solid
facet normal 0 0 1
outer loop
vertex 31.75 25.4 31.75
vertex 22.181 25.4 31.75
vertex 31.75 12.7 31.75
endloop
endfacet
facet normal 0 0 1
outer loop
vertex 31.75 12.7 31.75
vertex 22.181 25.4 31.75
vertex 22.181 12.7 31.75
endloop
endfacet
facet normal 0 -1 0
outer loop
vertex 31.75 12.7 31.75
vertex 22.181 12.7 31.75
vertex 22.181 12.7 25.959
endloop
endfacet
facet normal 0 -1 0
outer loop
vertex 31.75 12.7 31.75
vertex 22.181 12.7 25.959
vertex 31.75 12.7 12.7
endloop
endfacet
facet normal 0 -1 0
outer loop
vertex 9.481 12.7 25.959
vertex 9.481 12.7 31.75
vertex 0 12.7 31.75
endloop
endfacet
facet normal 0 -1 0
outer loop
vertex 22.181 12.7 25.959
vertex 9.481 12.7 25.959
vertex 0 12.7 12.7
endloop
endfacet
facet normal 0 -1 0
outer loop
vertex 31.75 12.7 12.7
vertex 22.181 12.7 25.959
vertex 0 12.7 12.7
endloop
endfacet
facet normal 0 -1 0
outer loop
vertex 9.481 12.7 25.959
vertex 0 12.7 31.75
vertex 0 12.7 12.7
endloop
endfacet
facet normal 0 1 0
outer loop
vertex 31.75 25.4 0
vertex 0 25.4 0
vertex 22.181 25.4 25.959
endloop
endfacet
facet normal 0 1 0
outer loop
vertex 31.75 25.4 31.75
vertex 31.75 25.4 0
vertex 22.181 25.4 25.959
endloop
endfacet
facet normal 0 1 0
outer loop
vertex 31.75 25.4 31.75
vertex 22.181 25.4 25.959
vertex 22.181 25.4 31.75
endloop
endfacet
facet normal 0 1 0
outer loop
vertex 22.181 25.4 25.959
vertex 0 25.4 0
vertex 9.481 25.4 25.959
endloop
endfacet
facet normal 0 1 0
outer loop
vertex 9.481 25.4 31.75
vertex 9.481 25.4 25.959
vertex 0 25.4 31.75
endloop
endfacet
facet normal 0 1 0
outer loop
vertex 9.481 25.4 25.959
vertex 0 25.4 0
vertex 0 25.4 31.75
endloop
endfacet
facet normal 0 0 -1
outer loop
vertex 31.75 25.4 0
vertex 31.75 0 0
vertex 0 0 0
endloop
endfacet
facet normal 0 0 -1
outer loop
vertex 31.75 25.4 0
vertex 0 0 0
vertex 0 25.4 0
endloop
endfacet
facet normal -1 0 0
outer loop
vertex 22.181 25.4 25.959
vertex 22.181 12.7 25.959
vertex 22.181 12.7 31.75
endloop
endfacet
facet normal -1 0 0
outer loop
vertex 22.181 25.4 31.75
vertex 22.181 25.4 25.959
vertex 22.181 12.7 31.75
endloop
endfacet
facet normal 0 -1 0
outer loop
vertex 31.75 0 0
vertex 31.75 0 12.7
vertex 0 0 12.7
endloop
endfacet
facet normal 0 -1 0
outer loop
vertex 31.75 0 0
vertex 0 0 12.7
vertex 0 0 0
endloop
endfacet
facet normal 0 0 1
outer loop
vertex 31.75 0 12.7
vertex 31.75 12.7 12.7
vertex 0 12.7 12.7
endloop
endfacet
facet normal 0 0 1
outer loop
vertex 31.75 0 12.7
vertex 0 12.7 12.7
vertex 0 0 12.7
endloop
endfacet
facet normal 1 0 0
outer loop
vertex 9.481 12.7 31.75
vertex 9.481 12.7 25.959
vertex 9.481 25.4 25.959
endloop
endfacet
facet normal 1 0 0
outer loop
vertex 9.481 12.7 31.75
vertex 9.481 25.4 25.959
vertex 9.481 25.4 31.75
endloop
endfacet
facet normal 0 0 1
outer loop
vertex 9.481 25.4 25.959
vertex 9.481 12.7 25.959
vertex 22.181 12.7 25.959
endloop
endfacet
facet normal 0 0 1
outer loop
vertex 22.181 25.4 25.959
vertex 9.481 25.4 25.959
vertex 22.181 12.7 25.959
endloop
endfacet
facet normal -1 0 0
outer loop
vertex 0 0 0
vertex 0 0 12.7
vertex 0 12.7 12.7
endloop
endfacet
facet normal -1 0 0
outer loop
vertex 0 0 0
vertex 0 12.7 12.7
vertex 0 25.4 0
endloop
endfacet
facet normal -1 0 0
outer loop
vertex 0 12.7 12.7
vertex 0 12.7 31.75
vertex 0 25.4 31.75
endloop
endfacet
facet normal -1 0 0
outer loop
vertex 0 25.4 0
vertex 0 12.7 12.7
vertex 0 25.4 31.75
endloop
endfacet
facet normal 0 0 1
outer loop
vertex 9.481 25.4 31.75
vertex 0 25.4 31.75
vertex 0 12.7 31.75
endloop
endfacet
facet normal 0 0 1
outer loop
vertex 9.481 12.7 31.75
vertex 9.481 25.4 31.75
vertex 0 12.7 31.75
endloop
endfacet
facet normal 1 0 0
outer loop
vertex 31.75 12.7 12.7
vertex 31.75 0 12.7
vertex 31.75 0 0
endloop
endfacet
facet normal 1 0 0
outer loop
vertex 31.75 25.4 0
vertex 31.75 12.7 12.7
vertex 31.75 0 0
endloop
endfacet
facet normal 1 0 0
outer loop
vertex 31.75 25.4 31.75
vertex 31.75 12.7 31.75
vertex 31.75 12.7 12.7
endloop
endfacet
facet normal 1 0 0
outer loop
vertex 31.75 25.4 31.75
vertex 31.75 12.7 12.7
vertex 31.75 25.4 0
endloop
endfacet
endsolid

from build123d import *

# Parameters (mm, degrees)
F1_DEPTH = 31.75
F2_W     = 12.7
F2_H     = 6.35
F3_DEPTH = 25.4
F4_DEPTH = 25.4


with BuildPart() as f1:
    # F0 (on Right) → F1 (new body)
    with BuildSketch(Plane.YZ):
        Polygon((0, 12.7), (0, 0), (25.4, 0), (25.4, 31.75), (12.7, 31.75), (12.7, 12.7), align=None)
    extrude(amount=F1_DEPTH)

    # F2 (on Front) → F3 (cut)
    with BuildSketch(Plane.XZ):
        with Locations((15.830855, 29.134337)):
            Rectangle(F2_W, F2_H)
    extrude(amount=-F3_DEPTH, mode=Mode.SUBTRACT)

    # F2 (on Front) → F4 (cut)
    with BuildSketch(Plane.XZ):
        with Locations((15.830855, 29.134337)):
            Rectangle(F2_W, F2_H)
    extrude(amount=-F4_DEPTH, mode=Mode.SUBTRACT)


solid = f1.part
